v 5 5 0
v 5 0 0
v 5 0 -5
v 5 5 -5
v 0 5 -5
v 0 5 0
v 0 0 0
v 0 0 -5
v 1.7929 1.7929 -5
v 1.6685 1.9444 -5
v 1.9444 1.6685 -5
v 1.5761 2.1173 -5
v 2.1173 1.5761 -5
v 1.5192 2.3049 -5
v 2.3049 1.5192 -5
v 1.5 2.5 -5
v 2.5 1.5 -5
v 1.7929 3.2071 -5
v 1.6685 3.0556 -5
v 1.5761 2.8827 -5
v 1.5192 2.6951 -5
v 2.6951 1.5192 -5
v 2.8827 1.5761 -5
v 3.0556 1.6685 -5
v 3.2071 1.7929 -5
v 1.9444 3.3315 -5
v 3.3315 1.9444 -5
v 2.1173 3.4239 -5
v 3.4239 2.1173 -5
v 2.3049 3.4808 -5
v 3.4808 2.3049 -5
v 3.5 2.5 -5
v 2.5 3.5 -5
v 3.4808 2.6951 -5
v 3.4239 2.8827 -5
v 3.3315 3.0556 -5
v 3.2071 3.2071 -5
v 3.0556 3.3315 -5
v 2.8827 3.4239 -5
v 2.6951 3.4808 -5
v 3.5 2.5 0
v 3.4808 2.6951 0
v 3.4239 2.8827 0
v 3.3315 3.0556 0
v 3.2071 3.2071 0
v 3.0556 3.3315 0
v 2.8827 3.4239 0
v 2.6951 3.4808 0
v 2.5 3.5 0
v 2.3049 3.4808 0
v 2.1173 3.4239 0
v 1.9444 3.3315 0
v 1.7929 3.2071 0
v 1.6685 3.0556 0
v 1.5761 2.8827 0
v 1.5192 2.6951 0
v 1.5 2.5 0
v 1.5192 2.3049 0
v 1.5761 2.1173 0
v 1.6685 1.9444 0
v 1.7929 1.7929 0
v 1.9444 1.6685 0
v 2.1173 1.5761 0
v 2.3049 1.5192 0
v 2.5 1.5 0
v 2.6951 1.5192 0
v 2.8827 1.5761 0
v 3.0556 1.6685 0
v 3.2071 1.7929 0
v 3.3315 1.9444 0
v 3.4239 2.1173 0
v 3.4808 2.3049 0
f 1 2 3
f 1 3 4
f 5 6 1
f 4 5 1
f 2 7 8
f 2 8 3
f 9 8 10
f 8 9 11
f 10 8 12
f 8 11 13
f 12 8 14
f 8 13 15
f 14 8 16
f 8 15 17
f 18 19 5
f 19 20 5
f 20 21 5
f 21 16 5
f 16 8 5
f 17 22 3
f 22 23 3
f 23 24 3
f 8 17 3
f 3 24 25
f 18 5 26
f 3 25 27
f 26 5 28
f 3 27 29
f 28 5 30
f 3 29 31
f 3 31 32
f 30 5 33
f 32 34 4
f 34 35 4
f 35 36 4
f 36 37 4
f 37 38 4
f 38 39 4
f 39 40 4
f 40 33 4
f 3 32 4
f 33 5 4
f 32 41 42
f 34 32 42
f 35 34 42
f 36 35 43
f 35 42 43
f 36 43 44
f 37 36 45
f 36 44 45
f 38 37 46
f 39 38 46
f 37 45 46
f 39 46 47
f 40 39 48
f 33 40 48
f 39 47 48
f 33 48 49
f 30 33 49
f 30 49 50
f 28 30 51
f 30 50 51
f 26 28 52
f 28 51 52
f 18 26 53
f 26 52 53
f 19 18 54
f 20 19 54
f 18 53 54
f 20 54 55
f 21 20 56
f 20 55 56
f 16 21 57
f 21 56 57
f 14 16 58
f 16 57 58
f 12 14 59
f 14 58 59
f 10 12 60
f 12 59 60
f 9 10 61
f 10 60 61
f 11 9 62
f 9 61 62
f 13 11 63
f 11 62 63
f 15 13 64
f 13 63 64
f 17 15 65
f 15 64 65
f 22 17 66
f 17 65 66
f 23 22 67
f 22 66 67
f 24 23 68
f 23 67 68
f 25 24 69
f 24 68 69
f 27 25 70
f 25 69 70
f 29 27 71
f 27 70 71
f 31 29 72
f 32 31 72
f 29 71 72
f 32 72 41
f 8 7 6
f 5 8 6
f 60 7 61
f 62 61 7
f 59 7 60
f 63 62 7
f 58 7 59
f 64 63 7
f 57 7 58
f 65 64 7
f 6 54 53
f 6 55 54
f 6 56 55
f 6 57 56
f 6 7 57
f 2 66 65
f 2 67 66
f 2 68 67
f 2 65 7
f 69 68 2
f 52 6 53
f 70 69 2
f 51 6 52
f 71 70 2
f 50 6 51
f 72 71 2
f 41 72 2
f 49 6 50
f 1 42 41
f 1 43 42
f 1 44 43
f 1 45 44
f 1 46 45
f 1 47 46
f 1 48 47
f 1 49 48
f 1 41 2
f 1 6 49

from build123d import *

# Parameters (mm, degrees)
SKETCH_1_W          = 5
SKETCH_1_H          = 5
EXTRUDE_1_DEPTH     = 5
SKETCH_3_R          = 1
CUT_EXTRUDE_1_DEPTH = 5


with BuildPart() as part:
    # 草图1 → 凸台-拉伸1 (new body)
    with BuildSketch(Plane.XY):
        with Locations((2.5, 2.5)):
            Rectangle(SKETCH_1_W, SKETCH_1_H)
    extrude(amount=-EXTRUDE_1_DEPTH)

    # 草图3 → 切除-拉伸1 (cut)
    with BuildSketch(Plane.XY):
        with Locations((2.5, 2.5)):
            Circle(SKETCH_3_R)
    extrude(amount=-CUT_EXTRUDE_1_DEPTH, mode=Mode.SUBTRACT)


solid = part.part
